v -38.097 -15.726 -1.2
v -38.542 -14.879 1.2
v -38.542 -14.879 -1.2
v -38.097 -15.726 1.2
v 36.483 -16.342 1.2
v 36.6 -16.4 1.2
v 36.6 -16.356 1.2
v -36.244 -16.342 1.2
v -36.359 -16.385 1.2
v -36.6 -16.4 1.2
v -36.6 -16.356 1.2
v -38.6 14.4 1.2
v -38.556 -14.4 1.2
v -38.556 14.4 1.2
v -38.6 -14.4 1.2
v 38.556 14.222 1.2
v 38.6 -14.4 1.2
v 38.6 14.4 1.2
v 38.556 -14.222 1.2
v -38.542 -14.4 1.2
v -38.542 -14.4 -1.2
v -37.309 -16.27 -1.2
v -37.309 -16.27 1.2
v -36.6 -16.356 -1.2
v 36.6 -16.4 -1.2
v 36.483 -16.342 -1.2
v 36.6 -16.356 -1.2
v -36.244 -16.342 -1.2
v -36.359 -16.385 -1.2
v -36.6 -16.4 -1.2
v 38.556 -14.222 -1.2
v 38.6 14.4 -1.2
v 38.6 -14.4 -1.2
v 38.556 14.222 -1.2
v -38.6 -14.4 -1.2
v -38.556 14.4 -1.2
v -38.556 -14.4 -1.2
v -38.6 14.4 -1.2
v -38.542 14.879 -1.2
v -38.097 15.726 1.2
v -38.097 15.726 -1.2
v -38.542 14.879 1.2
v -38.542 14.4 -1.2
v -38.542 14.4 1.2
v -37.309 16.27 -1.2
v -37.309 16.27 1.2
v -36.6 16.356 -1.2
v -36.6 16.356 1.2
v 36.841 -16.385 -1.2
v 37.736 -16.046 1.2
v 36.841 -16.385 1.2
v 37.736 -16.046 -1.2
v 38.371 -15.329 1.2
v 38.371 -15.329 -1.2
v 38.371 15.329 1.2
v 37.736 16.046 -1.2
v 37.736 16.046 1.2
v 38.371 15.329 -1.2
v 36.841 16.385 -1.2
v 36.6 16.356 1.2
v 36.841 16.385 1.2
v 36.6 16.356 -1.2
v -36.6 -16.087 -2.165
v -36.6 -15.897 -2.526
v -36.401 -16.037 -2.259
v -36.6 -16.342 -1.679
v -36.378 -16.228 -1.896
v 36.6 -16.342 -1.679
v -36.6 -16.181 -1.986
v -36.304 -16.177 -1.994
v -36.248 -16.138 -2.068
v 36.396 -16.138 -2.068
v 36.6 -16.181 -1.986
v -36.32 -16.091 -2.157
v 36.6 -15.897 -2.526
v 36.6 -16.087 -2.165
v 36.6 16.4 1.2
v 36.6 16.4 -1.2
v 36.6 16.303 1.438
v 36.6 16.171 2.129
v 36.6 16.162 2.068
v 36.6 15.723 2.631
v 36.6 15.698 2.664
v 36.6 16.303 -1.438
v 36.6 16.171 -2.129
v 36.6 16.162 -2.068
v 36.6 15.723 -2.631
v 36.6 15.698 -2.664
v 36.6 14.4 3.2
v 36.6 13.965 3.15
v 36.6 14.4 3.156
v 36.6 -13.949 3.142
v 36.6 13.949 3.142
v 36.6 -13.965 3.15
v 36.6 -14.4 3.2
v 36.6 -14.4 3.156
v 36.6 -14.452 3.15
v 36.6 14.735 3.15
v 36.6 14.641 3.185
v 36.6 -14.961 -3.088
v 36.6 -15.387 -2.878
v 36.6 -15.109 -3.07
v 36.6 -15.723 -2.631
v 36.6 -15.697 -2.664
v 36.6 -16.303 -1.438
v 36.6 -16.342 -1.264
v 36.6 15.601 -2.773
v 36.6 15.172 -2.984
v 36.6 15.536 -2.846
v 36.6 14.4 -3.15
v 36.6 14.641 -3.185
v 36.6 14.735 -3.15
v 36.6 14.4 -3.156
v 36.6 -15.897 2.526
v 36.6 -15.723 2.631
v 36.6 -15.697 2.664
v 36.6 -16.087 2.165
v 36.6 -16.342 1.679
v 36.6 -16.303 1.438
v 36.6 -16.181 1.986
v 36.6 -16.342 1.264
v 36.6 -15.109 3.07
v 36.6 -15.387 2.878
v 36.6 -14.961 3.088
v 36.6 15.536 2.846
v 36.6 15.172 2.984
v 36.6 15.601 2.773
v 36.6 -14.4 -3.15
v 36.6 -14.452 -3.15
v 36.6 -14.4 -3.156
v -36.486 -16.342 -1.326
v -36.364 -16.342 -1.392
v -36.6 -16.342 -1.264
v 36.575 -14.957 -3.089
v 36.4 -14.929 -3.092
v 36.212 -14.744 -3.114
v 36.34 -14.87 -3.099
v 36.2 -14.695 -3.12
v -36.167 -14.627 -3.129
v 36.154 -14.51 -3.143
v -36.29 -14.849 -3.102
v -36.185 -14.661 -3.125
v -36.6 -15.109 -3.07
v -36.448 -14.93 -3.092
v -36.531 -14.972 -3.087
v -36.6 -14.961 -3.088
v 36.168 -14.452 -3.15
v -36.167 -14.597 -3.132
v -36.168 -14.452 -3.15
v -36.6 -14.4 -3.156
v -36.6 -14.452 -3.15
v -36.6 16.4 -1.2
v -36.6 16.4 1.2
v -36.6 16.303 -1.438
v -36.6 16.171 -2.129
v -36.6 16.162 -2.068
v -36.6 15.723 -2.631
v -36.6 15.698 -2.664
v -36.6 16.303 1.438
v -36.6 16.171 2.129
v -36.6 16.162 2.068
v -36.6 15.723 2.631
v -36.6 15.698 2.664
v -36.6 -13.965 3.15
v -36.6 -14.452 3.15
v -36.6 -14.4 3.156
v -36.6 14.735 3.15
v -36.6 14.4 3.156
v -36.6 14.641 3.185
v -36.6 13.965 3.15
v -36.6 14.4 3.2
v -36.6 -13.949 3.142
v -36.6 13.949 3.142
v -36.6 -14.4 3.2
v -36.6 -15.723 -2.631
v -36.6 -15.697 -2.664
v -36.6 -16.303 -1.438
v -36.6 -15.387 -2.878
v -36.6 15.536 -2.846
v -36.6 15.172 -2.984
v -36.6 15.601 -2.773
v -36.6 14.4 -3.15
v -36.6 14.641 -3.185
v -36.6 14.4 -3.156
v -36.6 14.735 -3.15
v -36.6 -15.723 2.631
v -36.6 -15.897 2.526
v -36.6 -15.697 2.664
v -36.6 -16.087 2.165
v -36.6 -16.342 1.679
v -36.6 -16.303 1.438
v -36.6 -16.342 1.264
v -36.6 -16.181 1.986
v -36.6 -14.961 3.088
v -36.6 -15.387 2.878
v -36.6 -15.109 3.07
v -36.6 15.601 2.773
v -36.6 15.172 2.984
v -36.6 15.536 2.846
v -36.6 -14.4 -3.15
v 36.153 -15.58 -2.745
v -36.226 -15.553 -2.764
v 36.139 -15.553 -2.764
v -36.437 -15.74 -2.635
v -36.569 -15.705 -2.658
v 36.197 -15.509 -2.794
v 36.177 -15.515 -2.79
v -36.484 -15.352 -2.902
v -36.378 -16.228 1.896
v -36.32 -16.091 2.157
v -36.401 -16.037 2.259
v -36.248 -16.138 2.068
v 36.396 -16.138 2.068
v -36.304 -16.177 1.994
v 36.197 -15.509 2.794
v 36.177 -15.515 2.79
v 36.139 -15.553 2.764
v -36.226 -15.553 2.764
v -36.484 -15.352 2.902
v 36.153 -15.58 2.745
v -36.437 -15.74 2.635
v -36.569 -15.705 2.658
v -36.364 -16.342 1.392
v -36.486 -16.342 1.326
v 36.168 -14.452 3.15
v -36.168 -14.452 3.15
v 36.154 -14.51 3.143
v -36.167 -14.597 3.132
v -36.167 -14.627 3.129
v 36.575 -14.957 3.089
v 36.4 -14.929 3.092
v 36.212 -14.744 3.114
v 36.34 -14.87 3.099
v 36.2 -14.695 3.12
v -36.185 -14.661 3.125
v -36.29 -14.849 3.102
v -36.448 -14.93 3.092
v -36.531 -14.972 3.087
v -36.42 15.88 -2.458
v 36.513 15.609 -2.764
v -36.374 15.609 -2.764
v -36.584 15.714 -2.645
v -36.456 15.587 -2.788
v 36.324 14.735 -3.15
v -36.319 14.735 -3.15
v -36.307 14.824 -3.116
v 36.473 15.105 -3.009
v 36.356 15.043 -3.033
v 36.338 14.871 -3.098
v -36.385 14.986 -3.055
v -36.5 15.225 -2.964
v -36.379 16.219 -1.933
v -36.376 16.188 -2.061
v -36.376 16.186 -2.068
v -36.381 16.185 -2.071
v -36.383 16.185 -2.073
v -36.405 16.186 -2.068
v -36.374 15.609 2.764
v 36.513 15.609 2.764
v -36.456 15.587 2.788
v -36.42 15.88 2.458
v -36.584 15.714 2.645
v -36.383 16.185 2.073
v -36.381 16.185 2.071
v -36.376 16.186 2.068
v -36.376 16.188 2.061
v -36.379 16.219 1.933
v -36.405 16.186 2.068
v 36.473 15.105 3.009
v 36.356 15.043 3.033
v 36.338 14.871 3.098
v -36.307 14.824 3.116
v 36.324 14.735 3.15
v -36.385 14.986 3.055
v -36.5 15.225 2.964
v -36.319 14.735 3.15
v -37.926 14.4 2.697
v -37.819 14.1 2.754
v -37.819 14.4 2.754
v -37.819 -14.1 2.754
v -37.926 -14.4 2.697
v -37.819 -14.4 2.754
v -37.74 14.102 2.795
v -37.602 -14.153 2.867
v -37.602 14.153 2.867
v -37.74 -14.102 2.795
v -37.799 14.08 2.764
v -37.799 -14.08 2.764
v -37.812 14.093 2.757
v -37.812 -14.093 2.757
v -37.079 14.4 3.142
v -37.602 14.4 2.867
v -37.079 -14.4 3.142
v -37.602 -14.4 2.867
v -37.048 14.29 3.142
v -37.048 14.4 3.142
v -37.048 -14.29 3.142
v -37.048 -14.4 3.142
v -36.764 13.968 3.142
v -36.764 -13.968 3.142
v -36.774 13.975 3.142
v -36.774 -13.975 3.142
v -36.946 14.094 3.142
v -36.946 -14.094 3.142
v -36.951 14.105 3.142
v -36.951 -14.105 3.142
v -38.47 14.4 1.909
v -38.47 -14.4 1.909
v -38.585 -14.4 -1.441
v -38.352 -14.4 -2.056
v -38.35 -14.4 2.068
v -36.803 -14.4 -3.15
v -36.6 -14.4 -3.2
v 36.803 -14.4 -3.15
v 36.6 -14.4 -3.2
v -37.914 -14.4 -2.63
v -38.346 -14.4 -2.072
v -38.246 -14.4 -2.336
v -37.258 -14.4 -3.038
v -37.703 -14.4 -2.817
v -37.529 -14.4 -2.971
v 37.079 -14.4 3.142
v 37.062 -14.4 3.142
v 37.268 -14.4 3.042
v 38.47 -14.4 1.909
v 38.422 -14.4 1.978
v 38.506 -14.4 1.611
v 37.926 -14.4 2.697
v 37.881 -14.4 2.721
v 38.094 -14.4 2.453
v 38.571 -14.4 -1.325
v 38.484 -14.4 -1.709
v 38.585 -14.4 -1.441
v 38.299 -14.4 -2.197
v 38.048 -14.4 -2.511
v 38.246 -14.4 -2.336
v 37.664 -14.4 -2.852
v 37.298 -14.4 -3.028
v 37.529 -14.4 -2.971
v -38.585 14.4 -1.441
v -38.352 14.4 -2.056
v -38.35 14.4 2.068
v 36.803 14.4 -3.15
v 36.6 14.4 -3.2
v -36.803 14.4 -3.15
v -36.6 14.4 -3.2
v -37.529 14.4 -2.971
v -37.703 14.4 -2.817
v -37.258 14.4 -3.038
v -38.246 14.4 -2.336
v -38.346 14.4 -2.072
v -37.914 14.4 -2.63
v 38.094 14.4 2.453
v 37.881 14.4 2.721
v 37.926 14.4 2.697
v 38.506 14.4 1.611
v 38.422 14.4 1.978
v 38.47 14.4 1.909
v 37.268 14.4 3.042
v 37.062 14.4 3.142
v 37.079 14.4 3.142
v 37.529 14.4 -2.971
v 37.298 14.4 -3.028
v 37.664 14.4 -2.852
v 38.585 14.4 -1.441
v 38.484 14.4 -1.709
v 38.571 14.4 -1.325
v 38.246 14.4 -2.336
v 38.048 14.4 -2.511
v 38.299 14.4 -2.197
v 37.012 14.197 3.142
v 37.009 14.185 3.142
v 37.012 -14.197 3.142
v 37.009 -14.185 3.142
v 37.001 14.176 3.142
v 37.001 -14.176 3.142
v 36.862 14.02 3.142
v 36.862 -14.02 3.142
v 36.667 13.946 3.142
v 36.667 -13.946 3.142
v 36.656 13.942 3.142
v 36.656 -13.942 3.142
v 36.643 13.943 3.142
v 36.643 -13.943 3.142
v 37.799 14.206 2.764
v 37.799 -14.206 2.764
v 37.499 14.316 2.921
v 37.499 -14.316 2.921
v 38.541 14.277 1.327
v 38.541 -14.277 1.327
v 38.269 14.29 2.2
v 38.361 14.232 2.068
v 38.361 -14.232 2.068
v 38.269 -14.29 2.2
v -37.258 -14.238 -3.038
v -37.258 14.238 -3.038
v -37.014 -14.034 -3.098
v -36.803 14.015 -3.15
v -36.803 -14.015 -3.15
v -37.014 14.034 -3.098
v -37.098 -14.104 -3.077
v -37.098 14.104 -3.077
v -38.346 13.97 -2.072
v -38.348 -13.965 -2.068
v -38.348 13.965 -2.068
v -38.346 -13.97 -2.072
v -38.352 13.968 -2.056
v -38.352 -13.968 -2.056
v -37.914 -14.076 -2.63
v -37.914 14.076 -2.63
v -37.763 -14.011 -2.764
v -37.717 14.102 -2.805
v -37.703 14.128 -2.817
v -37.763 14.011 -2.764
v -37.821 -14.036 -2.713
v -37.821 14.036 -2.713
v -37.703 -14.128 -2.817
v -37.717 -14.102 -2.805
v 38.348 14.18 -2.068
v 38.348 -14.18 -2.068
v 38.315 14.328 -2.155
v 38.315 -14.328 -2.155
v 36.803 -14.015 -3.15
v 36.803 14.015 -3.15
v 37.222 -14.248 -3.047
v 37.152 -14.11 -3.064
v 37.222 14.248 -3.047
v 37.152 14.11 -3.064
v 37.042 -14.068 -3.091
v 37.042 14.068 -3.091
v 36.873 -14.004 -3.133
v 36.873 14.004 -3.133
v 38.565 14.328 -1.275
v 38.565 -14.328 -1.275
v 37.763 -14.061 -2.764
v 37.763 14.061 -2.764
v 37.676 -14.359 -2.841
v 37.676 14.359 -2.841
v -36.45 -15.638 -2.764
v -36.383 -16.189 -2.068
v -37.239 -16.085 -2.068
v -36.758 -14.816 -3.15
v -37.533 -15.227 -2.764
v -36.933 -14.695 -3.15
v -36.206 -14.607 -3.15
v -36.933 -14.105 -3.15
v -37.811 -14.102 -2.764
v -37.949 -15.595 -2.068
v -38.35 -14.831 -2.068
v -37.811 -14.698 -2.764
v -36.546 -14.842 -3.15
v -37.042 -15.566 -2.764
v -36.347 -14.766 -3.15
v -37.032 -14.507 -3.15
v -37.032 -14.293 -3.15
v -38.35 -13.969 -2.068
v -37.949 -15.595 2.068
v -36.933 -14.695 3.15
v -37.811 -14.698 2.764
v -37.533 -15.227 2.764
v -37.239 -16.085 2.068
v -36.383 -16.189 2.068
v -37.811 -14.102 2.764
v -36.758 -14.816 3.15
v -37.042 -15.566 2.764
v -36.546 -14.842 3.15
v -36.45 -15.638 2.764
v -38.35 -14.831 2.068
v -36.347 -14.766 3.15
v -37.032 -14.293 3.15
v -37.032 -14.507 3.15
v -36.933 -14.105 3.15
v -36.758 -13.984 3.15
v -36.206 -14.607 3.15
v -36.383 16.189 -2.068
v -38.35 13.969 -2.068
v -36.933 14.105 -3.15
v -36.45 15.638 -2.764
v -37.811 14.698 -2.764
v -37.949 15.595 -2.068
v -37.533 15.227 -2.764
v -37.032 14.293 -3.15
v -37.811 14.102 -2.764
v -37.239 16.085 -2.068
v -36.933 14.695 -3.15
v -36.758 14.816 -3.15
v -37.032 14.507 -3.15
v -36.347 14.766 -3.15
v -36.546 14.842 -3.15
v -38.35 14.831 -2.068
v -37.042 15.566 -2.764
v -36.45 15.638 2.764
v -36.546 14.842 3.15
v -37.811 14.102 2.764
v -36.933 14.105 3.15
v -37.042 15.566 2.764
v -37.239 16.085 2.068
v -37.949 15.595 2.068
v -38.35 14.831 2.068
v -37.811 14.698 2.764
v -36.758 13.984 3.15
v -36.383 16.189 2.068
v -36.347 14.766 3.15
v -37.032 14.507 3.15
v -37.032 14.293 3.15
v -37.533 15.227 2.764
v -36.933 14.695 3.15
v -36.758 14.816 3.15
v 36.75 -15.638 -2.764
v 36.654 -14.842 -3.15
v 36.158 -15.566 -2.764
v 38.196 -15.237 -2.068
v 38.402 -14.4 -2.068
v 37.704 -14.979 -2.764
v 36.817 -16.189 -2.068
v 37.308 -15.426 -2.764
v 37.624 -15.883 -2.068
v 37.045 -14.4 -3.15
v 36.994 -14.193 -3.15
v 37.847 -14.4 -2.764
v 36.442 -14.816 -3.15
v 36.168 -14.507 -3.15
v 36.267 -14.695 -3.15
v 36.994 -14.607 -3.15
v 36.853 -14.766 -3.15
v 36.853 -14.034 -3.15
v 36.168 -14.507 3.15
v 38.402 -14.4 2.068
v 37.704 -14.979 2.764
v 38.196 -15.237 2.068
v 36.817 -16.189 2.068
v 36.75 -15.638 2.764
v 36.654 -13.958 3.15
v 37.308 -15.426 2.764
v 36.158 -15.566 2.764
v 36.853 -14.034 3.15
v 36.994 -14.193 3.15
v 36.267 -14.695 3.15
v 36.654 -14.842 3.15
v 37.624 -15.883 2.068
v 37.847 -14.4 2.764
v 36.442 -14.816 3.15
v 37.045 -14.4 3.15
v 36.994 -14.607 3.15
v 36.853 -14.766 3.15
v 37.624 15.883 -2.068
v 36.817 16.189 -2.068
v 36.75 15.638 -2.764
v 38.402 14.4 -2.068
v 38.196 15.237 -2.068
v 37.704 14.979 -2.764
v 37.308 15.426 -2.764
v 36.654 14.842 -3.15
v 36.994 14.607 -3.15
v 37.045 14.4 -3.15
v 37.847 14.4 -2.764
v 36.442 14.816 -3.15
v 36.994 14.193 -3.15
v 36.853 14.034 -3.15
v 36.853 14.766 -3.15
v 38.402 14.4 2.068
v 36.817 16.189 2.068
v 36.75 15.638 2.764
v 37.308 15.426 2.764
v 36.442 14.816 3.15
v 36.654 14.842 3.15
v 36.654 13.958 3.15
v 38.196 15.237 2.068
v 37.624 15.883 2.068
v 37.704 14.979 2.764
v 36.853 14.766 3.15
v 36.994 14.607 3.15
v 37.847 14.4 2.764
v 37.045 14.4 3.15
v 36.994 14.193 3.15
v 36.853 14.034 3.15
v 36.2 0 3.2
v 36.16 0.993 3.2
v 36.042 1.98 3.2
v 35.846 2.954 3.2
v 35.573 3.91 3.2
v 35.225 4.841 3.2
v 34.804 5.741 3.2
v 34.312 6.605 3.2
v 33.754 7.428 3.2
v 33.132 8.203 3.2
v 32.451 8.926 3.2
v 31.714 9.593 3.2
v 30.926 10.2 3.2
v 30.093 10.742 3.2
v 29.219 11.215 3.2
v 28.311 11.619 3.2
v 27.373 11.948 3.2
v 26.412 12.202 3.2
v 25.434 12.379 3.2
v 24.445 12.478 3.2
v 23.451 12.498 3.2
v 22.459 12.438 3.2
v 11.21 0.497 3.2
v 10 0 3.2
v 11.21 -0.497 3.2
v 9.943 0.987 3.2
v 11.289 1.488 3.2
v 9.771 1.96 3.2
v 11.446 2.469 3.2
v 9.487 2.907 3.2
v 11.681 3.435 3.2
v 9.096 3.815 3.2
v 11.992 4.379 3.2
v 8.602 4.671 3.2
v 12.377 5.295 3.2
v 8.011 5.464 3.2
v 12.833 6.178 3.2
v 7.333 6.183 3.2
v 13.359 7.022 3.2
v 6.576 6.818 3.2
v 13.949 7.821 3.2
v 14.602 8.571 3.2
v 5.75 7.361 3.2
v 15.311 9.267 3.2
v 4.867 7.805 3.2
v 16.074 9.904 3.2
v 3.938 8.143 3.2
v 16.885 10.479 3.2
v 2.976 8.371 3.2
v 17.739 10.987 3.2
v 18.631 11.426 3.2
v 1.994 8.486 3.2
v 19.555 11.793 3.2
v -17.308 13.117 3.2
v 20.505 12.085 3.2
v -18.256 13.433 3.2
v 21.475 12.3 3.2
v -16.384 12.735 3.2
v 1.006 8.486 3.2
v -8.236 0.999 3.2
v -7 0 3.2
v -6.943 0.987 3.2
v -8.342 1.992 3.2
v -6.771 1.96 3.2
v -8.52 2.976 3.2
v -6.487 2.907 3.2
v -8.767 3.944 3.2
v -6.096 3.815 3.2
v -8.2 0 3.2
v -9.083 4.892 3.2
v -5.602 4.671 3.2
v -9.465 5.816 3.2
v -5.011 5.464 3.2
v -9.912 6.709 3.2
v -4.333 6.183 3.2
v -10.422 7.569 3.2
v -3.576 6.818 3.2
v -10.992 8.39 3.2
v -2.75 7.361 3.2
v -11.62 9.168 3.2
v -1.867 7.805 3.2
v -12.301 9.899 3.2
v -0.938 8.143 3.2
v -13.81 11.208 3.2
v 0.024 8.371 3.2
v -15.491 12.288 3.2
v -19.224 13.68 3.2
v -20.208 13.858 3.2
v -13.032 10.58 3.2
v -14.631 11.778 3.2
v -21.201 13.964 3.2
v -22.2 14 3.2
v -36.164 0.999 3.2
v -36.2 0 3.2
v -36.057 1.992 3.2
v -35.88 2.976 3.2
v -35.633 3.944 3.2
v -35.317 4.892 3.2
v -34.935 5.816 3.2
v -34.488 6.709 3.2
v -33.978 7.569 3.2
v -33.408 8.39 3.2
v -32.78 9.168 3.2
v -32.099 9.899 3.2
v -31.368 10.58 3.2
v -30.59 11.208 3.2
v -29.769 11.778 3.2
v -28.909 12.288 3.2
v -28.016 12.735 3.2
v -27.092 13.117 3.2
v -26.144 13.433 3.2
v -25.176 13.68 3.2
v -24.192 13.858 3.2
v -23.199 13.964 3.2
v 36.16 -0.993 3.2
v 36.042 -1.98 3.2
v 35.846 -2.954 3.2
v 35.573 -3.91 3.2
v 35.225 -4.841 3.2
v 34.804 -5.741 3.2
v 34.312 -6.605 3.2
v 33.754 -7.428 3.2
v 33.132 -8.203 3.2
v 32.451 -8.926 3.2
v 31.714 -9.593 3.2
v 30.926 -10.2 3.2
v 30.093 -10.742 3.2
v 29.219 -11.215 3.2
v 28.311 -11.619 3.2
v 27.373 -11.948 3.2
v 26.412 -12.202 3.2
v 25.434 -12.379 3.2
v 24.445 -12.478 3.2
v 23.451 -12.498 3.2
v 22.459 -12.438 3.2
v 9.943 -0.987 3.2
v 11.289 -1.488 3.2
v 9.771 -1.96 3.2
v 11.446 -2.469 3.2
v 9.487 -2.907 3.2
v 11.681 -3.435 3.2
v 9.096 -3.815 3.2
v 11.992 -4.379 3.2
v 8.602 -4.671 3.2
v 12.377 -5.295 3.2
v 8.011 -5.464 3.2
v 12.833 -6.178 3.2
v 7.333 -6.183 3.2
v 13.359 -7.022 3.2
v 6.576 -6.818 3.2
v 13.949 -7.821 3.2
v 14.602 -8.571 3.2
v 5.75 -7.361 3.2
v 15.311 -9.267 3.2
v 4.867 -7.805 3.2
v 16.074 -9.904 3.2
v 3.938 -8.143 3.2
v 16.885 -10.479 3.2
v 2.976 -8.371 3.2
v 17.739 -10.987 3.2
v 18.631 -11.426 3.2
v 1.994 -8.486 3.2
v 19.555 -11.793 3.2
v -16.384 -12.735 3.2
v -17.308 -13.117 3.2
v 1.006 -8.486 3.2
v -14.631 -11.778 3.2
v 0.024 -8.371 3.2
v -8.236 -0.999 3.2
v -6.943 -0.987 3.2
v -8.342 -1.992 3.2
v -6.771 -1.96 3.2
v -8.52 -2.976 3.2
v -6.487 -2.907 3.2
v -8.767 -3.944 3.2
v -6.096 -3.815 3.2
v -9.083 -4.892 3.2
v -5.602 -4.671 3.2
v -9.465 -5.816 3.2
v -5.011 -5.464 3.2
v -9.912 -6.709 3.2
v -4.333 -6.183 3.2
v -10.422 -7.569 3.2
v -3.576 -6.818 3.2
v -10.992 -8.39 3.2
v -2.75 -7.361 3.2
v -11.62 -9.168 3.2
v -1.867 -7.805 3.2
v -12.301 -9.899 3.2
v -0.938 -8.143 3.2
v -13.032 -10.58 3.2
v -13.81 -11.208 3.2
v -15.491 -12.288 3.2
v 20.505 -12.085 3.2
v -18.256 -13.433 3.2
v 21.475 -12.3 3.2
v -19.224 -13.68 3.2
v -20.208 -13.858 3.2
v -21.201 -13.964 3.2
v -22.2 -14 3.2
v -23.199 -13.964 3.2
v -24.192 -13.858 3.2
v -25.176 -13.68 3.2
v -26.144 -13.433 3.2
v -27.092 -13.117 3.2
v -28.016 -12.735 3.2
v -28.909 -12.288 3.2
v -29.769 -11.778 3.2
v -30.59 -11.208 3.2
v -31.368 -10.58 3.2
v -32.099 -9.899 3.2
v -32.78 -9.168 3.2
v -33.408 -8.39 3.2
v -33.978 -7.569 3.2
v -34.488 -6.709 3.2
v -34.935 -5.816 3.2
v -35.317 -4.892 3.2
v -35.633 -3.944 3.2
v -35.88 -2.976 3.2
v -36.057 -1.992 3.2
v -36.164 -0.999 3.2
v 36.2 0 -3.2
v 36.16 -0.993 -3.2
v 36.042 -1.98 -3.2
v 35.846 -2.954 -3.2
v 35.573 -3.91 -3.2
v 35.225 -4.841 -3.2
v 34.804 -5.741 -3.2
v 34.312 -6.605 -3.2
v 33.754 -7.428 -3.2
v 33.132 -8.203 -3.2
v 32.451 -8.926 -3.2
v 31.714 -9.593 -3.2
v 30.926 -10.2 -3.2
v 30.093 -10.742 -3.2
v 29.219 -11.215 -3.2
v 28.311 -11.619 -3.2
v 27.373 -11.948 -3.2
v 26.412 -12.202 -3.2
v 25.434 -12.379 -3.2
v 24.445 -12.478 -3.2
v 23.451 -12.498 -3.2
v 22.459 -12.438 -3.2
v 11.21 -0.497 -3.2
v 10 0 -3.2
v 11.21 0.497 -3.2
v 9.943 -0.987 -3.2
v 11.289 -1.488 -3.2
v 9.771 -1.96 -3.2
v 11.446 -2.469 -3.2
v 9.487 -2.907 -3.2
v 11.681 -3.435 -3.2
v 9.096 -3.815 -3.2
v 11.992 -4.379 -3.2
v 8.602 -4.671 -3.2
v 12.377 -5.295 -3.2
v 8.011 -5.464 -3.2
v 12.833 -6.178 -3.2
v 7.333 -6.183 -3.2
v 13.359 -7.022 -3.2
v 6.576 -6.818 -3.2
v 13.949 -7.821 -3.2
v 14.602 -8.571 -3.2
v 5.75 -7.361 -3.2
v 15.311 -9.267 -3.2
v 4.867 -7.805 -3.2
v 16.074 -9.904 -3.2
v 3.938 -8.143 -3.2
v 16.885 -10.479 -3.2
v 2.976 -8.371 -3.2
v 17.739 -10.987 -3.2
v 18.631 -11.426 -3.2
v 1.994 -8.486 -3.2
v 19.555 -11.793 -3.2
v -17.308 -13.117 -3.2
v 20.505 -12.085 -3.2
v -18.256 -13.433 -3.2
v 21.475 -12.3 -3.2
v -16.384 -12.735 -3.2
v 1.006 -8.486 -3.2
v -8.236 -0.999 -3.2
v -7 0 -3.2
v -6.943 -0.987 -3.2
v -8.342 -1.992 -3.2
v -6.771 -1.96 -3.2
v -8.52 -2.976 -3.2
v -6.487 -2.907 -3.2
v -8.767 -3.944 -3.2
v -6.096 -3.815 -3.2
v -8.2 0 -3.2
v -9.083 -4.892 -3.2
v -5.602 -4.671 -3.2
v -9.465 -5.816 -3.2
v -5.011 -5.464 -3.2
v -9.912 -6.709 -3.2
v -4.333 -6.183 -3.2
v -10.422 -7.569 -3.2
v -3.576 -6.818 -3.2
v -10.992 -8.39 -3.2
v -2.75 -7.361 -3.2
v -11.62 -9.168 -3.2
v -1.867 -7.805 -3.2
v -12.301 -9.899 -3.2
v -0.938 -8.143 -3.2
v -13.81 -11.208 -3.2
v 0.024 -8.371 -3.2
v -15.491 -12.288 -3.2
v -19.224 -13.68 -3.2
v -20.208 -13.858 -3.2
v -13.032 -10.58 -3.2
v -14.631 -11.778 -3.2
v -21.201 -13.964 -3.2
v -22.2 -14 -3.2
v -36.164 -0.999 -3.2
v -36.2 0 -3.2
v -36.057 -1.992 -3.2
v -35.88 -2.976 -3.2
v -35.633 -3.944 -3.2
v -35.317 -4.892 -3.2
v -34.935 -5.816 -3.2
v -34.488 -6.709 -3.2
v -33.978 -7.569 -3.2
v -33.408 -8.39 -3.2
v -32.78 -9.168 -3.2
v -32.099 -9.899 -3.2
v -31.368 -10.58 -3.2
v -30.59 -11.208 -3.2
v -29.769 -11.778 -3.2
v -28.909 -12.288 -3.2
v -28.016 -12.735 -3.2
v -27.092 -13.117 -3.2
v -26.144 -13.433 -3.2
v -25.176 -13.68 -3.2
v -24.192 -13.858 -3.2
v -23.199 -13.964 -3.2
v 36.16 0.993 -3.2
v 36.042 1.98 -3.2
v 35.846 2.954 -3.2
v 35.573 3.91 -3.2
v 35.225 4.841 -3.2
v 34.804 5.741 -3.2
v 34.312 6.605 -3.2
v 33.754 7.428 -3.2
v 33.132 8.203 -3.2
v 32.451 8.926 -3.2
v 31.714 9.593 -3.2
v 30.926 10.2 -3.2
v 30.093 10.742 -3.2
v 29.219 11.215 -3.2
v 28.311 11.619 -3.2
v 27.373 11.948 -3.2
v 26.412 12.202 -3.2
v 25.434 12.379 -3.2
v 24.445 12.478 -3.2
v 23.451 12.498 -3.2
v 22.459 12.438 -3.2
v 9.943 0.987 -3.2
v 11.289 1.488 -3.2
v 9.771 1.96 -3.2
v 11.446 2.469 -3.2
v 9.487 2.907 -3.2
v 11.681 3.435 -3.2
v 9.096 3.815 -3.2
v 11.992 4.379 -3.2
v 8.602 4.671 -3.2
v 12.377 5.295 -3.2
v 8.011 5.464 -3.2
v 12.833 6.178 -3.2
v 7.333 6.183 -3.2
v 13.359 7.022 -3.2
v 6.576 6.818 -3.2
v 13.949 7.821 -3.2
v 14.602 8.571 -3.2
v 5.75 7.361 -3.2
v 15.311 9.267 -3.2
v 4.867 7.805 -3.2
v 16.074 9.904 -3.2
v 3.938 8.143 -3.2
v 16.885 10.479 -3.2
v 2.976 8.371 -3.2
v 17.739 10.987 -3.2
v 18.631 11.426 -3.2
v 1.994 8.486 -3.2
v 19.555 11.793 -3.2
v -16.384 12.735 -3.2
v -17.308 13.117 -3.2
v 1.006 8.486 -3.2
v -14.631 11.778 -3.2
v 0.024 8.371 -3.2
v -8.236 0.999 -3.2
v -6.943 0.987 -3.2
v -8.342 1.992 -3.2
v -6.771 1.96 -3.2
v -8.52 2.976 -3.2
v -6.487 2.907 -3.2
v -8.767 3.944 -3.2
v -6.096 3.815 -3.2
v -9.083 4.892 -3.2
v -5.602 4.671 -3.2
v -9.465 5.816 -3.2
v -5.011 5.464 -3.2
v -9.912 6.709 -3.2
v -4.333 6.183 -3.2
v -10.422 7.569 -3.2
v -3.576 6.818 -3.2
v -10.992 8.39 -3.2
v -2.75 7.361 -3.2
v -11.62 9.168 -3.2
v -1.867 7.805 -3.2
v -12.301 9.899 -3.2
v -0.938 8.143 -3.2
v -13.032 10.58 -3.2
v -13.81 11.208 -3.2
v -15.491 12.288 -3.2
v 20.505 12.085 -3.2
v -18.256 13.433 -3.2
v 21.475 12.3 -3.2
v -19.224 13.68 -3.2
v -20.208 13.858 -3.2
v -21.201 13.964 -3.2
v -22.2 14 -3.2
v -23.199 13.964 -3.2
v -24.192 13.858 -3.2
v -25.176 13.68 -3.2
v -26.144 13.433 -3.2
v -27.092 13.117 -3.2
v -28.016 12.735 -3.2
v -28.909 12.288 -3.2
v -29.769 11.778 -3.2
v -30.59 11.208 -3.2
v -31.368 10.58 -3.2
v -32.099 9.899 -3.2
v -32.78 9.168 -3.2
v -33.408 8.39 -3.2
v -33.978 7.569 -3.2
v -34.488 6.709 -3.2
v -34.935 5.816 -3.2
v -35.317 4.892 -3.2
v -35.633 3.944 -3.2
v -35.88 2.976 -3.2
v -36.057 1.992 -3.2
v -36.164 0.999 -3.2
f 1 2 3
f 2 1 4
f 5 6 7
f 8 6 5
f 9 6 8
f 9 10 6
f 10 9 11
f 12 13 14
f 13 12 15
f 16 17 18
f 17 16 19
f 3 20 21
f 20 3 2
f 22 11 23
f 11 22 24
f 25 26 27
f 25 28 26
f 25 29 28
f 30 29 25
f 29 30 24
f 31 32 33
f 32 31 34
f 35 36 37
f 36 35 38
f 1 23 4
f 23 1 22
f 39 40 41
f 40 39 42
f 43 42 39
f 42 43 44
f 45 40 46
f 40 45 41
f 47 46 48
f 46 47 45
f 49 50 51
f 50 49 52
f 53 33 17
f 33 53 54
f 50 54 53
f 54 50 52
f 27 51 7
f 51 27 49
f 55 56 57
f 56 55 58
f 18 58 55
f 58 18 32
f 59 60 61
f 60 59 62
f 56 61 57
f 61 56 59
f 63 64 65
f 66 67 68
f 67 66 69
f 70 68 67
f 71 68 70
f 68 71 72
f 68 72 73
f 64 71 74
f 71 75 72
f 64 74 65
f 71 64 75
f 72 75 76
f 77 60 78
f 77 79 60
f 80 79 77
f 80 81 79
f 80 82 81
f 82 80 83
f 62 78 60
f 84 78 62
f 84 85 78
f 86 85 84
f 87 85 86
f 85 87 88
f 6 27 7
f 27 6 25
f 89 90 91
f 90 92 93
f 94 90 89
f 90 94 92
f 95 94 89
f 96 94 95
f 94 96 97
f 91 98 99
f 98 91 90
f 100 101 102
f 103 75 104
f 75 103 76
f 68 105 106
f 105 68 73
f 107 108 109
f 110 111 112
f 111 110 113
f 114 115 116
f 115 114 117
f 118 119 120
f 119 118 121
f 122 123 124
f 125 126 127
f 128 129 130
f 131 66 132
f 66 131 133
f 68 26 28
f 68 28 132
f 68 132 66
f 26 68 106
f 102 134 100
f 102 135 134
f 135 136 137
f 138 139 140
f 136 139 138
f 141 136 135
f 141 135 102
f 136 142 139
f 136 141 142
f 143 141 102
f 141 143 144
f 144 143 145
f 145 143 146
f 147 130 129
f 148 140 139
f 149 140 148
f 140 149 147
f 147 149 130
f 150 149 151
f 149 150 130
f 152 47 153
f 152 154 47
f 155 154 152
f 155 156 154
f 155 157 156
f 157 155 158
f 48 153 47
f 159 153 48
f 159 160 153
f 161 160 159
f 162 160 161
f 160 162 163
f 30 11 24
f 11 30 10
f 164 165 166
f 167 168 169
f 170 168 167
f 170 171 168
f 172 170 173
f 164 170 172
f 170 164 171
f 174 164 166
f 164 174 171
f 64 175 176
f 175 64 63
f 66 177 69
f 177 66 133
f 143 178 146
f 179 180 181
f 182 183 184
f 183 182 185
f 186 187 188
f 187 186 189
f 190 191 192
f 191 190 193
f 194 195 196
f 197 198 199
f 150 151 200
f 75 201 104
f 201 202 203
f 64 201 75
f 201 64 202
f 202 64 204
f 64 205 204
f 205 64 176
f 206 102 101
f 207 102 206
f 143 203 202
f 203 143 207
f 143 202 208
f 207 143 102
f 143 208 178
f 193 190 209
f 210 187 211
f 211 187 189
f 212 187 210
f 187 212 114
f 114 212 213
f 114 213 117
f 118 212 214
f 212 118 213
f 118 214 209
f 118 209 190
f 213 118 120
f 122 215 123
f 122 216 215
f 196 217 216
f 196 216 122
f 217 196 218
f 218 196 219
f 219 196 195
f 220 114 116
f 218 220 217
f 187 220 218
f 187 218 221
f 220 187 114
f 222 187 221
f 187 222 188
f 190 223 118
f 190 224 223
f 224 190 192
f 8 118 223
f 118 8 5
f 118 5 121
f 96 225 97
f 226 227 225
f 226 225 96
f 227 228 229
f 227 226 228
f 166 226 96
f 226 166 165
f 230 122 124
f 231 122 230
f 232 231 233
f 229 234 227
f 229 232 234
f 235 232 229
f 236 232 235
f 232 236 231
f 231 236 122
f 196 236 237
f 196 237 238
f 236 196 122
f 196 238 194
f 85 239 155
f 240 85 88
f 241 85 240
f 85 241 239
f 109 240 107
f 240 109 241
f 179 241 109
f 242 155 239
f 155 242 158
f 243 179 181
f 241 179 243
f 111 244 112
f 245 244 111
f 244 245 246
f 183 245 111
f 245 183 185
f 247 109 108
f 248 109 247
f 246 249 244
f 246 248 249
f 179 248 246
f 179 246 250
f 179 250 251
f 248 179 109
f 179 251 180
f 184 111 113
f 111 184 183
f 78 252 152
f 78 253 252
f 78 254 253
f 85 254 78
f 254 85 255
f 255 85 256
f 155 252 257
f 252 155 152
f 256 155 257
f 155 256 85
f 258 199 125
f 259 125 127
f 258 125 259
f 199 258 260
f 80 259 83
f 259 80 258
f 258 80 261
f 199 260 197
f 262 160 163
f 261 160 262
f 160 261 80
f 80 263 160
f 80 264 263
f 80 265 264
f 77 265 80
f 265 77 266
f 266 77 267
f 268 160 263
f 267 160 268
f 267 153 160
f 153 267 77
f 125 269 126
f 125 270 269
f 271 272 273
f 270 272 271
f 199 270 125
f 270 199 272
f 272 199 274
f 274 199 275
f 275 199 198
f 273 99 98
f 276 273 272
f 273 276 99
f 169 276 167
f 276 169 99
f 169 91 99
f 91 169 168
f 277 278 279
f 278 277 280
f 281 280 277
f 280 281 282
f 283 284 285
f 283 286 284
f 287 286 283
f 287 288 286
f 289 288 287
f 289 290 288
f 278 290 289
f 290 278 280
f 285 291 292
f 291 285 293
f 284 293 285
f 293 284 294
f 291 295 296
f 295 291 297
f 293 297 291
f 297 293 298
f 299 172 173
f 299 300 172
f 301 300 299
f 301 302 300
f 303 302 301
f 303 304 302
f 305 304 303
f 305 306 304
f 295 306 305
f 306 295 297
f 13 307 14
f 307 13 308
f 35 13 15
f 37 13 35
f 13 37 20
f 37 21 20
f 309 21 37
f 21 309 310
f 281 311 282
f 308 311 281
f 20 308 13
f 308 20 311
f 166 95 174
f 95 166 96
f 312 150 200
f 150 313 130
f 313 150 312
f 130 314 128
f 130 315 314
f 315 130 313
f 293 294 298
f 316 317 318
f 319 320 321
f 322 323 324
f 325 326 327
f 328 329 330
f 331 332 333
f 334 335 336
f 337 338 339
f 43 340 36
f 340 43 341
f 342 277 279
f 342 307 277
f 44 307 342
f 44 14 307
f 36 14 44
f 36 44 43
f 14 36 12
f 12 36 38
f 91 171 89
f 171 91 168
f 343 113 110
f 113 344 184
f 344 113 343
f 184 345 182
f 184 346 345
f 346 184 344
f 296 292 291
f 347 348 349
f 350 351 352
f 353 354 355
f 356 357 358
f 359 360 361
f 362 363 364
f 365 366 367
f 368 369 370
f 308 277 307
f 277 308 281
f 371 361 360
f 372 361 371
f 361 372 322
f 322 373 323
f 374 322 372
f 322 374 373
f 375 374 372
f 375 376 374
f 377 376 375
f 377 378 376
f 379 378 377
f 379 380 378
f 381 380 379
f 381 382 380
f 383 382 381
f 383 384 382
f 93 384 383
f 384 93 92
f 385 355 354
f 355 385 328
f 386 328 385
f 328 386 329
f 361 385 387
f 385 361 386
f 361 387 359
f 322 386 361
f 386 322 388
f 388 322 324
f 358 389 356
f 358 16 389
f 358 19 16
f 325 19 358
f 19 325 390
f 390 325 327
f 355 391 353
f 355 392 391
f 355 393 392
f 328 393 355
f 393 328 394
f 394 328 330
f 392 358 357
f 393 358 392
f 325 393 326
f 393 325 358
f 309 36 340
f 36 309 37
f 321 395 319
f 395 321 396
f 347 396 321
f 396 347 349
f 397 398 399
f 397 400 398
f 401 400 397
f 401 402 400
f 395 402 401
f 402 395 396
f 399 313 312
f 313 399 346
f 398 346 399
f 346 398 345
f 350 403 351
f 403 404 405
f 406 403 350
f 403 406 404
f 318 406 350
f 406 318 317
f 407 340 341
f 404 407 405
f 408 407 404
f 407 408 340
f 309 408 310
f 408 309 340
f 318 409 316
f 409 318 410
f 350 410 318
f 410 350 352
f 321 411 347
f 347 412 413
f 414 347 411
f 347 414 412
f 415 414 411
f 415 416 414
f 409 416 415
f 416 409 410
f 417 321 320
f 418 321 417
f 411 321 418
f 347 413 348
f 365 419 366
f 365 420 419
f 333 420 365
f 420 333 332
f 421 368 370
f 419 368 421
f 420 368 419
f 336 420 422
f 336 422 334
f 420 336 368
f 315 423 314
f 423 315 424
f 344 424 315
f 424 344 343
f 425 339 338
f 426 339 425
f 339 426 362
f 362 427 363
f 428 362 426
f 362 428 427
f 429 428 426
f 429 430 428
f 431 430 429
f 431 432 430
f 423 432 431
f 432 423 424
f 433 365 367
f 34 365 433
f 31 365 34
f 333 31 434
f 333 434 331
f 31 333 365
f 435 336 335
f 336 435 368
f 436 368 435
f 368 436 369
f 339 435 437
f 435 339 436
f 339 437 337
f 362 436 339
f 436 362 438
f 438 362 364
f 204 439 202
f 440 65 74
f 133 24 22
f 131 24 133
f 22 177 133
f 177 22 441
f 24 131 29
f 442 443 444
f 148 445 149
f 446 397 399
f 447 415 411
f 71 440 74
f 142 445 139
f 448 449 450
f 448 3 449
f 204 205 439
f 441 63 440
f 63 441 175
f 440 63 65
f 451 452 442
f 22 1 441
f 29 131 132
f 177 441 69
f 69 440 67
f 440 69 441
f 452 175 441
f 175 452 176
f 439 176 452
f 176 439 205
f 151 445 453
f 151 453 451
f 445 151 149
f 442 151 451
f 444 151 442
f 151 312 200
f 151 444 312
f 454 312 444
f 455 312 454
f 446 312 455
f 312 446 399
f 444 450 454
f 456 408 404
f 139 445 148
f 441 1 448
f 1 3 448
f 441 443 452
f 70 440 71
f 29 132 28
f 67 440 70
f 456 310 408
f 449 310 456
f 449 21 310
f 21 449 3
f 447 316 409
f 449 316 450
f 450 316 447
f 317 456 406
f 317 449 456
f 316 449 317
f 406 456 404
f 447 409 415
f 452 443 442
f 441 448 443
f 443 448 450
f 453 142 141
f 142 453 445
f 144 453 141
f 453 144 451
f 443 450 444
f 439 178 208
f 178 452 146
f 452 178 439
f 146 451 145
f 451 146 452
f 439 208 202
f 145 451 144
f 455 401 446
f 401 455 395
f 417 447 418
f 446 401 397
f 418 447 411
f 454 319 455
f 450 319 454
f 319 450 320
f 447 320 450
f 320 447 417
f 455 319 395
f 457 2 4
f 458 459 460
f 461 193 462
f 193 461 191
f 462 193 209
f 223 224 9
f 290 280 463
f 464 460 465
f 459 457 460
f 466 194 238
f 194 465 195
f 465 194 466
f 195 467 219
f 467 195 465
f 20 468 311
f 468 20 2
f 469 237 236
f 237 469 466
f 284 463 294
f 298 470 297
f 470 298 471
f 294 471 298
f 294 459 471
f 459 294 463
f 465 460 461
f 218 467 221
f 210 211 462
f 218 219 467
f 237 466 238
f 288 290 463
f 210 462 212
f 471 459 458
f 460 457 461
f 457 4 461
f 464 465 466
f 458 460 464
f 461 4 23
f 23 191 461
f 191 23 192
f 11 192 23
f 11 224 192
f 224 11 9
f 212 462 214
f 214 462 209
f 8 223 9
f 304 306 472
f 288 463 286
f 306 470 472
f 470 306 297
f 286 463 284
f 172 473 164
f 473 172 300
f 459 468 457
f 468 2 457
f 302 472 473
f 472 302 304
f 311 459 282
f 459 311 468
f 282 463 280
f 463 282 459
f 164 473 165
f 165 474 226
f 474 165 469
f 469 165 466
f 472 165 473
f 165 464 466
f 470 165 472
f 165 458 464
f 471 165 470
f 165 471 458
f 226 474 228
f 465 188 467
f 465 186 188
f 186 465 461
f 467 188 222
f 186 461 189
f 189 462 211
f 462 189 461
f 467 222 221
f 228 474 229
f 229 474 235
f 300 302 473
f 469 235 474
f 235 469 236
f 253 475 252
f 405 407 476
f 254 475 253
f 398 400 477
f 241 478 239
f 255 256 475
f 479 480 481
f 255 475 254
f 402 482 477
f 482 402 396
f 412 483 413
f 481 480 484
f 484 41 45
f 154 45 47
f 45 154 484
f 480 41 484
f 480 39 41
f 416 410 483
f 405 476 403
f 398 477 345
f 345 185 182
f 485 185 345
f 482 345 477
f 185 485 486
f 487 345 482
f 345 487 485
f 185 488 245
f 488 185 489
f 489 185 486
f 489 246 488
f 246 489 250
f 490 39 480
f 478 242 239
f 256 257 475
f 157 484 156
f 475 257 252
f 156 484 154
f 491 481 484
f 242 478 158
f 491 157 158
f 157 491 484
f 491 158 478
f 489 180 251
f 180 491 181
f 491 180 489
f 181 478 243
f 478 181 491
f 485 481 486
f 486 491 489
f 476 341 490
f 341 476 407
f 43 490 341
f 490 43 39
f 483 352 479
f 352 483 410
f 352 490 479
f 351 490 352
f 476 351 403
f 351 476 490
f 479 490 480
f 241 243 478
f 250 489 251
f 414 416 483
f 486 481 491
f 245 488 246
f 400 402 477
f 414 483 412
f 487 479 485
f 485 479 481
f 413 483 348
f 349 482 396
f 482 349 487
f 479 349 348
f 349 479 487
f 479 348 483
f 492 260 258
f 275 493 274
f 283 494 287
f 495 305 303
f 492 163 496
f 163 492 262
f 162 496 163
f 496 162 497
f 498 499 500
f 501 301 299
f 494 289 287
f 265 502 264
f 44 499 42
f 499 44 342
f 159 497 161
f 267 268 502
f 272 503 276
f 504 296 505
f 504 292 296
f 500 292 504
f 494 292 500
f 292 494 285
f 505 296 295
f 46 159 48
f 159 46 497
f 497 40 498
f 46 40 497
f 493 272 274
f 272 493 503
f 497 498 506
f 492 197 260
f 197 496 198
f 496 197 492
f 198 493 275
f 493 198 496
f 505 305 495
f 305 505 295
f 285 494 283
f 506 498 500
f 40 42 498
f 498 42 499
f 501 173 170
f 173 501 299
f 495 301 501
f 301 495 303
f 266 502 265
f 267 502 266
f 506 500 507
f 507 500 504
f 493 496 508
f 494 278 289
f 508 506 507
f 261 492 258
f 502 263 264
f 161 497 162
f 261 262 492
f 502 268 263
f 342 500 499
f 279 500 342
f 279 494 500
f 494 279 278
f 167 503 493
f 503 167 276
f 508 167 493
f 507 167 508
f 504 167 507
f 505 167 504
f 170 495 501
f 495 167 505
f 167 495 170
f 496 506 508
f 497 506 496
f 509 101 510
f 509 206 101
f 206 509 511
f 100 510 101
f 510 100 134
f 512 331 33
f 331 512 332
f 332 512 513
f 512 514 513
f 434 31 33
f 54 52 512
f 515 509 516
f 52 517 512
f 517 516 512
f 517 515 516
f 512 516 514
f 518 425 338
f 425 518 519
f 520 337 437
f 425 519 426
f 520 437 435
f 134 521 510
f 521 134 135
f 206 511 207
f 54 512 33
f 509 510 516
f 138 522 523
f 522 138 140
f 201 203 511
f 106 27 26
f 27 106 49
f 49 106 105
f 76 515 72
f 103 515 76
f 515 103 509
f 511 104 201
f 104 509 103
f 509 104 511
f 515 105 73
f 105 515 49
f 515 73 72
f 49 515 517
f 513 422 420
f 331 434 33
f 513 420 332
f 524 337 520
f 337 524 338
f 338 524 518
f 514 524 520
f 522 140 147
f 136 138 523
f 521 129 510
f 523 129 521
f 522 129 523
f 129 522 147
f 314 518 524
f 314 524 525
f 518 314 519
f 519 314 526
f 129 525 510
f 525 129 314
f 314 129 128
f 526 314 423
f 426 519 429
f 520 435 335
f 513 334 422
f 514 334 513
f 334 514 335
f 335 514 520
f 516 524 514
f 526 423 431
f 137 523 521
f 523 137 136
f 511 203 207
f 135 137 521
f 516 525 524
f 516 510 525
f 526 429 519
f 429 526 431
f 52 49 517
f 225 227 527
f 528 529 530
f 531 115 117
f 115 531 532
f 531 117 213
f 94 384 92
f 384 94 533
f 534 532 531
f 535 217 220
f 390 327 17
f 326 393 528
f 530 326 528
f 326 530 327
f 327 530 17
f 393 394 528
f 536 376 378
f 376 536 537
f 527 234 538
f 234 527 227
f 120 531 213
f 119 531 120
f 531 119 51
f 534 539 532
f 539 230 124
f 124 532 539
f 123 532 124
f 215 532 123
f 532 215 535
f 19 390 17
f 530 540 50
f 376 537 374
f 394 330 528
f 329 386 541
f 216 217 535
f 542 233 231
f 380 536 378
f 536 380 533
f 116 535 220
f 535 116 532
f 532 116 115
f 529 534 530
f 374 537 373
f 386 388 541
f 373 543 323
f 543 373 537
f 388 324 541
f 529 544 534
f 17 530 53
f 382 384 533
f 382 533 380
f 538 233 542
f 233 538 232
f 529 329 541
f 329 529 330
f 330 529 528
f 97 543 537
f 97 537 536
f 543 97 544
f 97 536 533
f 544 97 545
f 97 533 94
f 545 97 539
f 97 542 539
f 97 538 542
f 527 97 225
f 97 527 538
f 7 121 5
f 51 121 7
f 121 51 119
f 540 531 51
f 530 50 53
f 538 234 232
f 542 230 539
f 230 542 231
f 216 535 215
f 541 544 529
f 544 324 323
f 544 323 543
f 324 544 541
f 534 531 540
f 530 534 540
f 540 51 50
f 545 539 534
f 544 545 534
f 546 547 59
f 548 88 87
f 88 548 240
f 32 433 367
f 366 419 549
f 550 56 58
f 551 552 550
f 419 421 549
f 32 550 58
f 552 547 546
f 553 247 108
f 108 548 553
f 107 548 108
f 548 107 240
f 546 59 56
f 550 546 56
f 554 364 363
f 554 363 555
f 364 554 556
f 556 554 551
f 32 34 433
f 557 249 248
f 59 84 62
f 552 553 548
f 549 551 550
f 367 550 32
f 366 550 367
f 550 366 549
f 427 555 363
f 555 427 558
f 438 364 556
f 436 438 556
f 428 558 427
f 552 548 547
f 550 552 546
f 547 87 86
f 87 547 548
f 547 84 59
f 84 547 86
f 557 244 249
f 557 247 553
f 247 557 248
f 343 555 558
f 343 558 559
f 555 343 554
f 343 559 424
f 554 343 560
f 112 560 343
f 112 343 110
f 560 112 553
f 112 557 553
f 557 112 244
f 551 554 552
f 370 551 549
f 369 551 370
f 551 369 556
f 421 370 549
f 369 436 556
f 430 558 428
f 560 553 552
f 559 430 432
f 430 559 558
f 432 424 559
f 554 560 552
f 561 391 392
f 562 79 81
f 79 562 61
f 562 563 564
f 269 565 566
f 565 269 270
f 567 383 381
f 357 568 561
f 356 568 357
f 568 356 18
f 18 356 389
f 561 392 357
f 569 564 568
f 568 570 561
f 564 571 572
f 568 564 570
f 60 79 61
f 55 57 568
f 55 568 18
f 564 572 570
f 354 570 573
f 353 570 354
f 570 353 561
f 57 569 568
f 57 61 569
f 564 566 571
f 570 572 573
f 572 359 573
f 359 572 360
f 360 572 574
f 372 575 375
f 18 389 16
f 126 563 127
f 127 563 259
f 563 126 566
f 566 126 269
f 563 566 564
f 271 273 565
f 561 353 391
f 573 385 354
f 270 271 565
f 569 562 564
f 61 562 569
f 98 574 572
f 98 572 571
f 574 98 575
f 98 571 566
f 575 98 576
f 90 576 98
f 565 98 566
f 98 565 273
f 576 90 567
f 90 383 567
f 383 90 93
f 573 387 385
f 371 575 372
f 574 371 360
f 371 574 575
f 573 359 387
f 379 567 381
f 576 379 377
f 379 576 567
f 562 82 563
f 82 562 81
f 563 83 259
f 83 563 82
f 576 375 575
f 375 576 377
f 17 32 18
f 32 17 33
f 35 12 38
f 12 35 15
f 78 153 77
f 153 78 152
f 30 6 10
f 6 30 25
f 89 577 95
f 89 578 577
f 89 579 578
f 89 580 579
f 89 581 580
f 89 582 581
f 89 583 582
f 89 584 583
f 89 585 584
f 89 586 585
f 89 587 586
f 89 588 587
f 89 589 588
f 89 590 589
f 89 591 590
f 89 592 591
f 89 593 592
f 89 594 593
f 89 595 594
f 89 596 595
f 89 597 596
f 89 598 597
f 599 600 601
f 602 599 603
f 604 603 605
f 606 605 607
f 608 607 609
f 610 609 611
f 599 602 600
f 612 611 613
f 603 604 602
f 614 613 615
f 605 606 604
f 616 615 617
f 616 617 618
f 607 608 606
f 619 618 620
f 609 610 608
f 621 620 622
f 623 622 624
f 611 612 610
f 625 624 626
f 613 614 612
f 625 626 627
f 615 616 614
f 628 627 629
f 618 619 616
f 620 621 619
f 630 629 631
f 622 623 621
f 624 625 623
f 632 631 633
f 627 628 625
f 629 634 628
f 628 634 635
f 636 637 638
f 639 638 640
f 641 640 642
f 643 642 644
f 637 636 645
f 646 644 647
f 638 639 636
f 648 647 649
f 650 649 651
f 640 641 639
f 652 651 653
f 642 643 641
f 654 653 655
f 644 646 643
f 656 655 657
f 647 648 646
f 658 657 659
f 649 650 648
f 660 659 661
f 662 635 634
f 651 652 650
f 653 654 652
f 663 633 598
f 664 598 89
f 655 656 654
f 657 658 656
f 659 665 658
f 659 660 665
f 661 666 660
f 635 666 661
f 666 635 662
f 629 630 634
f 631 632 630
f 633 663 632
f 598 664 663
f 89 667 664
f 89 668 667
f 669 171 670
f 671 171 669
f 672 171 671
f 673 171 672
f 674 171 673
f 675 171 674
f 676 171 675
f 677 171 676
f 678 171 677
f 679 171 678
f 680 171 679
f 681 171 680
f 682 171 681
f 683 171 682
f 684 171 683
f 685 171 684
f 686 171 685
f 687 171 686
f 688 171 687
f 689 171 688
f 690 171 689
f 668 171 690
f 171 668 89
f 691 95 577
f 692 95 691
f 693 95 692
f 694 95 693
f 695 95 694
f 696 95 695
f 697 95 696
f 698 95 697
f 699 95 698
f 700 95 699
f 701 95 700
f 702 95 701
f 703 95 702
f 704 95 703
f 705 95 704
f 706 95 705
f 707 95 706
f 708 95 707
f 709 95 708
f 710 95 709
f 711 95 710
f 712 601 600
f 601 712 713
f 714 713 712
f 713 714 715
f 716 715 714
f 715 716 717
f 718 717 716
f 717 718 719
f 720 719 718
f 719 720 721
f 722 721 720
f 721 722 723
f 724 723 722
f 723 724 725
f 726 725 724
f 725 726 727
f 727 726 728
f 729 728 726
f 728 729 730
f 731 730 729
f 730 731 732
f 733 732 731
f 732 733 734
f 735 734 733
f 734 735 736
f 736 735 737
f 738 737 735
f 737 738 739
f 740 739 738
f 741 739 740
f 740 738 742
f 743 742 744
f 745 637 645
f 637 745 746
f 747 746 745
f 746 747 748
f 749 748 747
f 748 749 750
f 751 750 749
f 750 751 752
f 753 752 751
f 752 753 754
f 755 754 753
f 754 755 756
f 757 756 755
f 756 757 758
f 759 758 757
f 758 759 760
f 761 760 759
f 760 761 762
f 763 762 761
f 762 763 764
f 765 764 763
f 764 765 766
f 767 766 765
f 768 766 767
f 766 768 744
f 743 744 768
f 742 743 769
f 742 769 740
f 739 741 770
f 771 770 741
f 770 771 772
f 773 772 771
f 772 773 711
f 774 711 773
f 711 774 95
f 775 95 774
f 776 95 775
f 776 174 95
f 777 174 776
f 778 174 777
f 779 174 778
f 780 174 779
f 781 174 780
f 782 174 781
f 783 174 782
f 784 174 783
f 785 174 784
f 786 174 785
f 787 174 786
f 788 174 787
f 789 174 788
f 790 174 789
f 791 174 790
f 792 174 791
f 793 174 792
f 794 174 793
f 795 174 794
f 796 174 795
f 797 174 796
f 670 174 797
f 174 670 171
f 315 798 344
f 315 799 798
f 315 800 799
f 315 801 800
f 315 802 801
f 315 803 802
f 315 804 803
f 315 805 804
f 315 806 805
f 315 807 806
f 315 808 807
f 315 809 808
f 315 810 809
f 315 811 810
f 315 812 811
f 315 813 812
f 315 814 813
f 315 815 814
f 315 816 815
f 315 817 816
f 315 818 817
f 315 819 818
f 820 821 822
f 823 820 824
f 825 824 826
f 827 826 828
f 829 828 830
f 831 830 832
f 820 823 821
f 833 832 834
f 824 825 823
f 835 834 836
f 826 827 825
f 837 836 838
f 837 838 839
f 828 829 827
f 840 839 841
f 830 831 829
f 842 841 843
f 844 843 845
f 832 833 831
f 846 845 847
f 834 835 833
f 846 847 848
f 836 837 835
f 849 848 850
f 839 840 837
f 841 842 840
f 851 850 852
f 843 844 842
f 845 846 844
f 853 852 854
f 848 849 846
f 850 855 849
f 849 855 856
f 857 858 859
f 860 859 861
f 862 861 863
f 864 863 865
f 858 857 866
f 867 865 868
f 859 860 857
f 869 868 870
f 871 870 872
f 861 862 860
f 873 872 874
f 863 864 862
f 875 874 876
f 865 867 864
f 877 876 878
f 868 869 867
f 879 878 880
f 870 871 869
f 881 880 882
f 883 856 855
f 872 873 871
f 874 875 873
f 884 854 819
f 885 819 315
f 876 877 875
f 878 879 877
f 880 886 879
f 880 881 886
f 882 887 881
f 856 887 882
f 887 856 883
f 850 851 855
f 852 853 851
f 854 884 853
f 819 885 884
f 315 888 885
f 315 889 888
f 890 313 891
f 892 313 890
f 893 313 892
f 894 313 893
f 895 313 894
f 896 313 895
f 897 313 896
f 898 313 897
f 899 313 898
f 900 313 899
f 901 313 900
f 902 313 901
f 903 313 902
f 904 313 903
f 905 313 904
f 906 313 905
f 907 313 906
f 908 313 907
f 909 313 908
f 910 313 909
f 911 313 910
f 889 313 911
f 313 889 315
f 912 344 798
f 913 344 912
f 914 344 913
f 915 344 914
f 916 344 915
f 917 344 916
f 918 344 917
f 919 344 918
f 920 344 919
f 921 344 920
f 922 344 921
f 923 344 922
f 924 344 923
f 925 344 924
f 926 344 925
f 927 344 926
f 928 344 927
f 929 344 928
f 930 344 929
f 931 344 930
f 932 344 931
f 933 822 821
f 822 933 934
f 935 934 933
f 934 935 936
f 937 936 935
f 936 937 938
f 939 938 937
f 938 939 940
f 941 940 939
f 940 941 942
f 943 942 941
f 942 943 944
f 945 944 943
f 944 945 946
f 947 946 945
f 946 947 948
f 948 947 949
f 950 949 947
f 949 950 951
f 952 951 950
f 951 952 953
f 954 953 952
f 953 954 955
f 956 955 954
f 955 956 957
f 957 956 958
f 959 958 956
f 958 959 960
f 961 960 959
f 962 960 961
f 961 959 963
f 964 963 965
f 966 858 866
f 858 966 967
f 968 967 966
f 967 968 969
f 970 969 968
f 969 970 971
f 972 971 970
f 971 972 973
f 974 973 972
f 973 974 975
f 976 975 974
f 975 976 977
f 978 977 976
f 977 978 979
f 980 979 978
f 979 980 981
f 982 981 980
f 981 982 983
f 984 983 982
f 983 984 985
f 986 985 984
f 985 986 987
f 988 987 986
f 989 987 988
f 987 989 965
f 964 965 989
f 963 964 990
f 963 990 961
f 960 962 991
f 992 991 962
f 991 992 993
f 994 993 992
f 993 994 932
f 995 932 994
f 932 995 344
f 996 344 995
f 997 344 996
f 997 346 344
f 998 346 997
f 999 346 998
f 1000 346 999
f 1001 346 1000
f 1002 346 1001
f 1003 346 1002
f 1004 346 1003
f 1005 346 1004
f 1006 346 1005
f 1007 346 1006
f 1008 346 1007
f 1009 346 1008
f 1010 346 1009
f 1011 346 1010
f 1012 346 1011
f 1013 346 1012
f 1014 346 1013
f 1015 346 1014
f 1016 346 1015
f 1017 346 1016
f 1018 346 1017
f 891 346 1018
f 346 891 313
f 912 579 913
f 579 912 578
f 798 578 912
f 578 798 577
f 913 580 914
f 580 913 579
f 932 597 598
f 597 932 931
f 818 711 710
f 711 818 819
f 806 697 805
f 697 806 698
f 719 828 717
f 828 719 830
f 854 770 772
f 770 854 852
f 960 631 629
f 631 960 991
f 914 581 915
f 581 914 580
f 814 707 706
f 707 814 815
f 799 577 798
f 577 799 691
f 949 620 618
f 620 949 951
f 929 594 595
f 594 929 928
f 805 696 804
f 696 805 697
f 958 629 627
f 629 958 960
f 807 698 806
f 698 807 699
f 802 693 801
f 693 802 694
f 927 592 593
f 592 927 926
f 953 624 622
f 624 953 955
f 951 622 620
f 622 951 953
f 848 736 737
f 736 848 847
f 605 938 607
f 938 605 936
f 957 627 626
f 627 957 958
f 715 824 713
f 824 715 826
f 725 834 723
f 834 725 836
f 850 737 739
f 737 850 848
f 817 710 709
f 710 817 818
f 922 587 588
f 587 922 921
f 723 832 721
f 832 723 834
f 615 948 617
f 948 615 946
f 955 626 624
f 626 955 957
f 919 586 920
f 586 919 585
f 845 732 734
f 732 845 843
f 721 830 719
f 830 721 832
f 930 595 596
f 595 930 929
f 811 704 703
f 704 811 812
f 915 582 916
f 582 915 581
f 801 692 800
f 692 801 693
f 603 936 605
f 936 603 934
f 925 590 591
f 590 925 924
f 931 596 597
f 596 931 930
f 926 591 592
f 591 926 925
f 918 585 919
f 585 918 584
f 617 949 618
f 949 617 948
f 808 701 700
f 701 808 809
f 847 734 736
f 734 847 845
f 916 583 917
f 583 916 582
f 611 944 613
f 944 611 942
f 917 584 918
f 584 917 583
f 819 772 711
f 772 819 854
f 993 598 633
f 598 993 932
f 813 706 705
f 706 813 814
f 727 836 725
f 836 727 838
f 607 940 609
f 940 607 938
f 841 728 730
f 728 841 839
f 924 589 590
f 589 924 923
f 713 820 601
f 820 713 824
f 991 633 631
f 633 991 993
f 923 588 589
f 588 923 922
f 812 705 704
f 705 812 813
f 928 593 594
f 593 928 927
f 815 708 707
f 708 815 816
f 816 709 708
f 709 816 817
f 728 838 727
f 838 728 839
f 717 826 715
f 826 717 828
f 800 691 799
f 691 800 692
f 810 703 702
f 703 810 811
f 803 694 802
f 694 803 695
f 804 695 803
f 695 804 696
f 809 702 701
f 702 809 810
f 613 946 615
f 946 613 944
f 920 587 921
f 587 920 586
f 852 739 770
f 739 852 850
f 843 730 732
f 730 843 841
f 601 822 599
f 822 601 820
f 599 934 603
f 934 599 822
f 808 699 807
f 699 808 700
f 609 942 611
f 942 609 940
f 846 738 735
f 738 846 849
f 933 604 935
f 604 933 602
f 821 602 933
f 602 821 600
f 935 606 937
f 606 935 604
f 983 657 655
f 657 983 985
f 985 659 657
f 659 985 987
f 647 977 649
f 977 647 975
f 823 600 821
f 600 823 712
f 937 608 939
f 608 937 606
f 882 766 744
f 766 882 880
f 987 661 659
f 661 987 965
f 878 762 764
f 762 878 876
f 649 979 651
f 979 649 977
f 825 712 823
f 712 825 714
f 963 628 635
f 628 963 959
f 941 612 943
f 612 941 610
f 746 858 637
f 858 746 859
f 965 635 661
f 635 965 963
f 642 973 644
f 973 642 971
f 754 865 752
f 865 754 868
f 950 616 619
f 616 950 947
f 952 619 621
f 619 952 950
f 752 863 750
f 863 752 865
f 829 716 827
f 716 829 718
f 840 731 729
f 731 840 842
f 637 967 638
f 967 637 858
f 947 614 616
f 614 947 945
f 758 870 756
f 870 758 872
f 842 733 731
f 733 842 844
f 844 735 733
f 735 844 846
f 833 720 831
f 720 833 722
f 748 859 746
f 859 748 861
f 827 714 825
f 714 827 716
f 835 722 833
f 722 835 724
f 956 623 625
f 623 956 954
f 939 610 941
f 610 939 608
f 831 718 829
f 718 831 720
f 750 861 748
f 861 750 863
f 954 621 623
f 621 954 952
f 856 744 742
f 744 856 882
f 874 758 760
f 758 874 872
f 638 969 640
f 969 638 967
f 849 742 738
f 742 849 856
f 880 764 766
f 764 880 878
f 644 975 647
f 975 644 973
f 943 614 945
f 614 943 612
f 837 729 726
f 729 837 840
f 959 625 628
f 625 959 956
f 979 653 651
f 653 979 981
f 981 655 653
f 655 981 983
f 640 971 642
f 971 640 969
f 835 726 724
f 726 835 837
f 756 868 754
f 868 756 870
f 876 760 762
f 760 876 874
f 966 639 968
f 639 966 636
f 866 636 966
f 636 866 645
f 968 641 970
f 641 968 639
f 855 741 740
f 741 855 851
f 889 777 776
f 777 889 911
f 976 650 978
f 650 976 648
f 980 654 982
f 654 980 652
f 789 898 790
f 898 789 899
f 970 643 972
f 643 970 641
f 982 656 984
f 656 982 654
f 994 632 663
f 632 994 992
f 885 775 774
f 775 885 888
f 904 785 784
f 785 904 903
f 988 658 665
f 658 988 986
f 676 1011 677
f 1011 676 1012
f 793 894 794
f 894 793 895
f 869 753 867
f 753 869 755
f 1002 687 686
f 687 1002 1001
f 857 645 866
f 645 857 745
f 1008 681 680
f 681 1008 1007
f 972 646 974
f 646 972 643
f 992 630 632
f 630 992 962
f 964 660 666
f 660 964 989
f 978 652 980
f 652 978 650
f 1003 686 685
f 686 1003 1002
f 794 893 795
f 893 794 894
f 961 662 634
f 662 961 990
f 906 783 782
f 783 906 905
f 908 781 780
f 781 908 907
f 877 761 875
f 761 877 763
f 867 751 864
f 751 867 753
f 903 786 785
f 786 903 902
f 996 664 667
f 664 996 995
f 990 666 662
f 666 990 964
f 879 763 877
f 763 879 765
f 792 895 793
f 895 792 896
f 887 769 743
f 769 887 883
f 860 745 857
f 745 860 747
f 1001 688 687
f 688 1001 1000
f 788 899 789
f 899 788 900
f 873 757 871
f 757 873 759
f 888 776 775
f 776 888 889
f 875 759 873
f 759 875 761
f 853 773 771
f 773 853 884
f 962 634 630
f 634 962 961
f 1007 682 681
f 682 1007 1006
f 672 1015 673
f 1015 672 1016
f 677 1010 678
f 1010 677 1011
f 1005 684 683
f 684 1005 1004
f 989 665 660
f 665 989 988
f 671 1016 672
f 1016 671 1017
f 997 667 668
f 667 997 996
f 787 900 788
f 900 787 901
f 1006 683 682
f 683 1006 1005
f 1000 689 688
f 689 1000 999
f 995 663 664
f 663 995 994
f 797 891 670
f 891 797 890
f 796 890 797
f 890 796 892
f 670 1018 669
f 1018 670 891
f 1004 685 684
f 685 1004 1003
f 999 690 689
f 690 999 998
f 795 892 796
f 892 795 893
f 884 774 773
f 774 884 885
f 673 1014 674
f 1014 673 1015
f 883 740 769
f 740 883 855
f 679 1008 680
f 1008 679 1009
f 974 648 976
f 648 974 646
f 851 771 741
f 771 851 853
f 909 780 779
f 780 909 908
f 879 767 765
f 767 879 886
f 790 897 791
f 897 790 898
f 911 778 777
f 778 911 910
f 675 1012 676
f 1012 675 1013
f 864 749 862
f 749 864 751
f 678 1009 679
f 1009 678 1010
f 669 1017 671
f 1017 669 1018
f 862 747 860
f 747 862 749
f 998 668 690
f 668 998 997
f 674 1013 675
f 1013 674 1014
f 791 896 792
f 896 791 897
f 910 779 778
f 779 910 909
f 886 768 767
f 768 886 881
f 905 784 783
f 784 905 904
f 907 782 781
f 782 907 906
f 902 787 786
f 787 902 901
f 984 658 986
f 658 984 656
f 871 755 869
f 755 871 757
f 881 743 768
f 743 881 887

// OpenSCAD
echo(version=version());
$fa=1;
$fs=1;

// Values are in millimeters
extusion_width=0.4;
wall_thickness=3*extusion_width;

//
pipeA = 25;
pipeB = 17;
pipeC = 28;

// Not sure if I'll use bolts or not yet.
// If we put a channel around the outside to hold a ziptie, that might be simpler
// (don't have to figure out places for bolts, don't have to have even spacing.)
bolt_head=5.5;
bolt_w=3;
bolt_l=12;

bolt_needs=bolt_head + wall_thickness*2;

zip_width=4;
zip_needs=zip_width + wall_thickness*2;


use <MCAD/boxes.scad>


box=[
	//bolt_needs + pipeA + wall_thickness + pipeB + wall_thickness + pipeC + bolt_needs,
	wall_thickness*2 + pipeA + wall_thickness + pipeB + wall_thickness + pipeC + wall_thickness*2,
	pipeC + wall_thickness*4,
	zip_needs
];

difference() {
	roundedBox(box, 2, false);

	translate([0,0,0]) {
		union() {
			translate([box[0]/2 - pipeA/2 - wall_thickness*2,0,0])
				cylinder(h=zip_needs+2, d=pipeA, center=true);
			translate([box[0]/2 - pipeA - wall_thickness*3 - pipeB/2,0,0])
				cylinder(h=zip_needs+2, d=pipeB, center=true);
			translate([-box[0]/2 + pipeC/2 + wall_thickness*2,0,0])
				cylinder(h=zip_needs+2, d=pipeC, center=true);
		}
	}


	// Channel for zip tie
	if(false) {
		difference() {
			translate([-box[0]/2, -box[1]/2, -2])
				cube([box[0], box[1], zip_width]);
			roundedBox([box[0]-1, box[1]-1, zip_width+2], 2, true);
		}
	}
}




// vim: set sw=2 ts=2 :
